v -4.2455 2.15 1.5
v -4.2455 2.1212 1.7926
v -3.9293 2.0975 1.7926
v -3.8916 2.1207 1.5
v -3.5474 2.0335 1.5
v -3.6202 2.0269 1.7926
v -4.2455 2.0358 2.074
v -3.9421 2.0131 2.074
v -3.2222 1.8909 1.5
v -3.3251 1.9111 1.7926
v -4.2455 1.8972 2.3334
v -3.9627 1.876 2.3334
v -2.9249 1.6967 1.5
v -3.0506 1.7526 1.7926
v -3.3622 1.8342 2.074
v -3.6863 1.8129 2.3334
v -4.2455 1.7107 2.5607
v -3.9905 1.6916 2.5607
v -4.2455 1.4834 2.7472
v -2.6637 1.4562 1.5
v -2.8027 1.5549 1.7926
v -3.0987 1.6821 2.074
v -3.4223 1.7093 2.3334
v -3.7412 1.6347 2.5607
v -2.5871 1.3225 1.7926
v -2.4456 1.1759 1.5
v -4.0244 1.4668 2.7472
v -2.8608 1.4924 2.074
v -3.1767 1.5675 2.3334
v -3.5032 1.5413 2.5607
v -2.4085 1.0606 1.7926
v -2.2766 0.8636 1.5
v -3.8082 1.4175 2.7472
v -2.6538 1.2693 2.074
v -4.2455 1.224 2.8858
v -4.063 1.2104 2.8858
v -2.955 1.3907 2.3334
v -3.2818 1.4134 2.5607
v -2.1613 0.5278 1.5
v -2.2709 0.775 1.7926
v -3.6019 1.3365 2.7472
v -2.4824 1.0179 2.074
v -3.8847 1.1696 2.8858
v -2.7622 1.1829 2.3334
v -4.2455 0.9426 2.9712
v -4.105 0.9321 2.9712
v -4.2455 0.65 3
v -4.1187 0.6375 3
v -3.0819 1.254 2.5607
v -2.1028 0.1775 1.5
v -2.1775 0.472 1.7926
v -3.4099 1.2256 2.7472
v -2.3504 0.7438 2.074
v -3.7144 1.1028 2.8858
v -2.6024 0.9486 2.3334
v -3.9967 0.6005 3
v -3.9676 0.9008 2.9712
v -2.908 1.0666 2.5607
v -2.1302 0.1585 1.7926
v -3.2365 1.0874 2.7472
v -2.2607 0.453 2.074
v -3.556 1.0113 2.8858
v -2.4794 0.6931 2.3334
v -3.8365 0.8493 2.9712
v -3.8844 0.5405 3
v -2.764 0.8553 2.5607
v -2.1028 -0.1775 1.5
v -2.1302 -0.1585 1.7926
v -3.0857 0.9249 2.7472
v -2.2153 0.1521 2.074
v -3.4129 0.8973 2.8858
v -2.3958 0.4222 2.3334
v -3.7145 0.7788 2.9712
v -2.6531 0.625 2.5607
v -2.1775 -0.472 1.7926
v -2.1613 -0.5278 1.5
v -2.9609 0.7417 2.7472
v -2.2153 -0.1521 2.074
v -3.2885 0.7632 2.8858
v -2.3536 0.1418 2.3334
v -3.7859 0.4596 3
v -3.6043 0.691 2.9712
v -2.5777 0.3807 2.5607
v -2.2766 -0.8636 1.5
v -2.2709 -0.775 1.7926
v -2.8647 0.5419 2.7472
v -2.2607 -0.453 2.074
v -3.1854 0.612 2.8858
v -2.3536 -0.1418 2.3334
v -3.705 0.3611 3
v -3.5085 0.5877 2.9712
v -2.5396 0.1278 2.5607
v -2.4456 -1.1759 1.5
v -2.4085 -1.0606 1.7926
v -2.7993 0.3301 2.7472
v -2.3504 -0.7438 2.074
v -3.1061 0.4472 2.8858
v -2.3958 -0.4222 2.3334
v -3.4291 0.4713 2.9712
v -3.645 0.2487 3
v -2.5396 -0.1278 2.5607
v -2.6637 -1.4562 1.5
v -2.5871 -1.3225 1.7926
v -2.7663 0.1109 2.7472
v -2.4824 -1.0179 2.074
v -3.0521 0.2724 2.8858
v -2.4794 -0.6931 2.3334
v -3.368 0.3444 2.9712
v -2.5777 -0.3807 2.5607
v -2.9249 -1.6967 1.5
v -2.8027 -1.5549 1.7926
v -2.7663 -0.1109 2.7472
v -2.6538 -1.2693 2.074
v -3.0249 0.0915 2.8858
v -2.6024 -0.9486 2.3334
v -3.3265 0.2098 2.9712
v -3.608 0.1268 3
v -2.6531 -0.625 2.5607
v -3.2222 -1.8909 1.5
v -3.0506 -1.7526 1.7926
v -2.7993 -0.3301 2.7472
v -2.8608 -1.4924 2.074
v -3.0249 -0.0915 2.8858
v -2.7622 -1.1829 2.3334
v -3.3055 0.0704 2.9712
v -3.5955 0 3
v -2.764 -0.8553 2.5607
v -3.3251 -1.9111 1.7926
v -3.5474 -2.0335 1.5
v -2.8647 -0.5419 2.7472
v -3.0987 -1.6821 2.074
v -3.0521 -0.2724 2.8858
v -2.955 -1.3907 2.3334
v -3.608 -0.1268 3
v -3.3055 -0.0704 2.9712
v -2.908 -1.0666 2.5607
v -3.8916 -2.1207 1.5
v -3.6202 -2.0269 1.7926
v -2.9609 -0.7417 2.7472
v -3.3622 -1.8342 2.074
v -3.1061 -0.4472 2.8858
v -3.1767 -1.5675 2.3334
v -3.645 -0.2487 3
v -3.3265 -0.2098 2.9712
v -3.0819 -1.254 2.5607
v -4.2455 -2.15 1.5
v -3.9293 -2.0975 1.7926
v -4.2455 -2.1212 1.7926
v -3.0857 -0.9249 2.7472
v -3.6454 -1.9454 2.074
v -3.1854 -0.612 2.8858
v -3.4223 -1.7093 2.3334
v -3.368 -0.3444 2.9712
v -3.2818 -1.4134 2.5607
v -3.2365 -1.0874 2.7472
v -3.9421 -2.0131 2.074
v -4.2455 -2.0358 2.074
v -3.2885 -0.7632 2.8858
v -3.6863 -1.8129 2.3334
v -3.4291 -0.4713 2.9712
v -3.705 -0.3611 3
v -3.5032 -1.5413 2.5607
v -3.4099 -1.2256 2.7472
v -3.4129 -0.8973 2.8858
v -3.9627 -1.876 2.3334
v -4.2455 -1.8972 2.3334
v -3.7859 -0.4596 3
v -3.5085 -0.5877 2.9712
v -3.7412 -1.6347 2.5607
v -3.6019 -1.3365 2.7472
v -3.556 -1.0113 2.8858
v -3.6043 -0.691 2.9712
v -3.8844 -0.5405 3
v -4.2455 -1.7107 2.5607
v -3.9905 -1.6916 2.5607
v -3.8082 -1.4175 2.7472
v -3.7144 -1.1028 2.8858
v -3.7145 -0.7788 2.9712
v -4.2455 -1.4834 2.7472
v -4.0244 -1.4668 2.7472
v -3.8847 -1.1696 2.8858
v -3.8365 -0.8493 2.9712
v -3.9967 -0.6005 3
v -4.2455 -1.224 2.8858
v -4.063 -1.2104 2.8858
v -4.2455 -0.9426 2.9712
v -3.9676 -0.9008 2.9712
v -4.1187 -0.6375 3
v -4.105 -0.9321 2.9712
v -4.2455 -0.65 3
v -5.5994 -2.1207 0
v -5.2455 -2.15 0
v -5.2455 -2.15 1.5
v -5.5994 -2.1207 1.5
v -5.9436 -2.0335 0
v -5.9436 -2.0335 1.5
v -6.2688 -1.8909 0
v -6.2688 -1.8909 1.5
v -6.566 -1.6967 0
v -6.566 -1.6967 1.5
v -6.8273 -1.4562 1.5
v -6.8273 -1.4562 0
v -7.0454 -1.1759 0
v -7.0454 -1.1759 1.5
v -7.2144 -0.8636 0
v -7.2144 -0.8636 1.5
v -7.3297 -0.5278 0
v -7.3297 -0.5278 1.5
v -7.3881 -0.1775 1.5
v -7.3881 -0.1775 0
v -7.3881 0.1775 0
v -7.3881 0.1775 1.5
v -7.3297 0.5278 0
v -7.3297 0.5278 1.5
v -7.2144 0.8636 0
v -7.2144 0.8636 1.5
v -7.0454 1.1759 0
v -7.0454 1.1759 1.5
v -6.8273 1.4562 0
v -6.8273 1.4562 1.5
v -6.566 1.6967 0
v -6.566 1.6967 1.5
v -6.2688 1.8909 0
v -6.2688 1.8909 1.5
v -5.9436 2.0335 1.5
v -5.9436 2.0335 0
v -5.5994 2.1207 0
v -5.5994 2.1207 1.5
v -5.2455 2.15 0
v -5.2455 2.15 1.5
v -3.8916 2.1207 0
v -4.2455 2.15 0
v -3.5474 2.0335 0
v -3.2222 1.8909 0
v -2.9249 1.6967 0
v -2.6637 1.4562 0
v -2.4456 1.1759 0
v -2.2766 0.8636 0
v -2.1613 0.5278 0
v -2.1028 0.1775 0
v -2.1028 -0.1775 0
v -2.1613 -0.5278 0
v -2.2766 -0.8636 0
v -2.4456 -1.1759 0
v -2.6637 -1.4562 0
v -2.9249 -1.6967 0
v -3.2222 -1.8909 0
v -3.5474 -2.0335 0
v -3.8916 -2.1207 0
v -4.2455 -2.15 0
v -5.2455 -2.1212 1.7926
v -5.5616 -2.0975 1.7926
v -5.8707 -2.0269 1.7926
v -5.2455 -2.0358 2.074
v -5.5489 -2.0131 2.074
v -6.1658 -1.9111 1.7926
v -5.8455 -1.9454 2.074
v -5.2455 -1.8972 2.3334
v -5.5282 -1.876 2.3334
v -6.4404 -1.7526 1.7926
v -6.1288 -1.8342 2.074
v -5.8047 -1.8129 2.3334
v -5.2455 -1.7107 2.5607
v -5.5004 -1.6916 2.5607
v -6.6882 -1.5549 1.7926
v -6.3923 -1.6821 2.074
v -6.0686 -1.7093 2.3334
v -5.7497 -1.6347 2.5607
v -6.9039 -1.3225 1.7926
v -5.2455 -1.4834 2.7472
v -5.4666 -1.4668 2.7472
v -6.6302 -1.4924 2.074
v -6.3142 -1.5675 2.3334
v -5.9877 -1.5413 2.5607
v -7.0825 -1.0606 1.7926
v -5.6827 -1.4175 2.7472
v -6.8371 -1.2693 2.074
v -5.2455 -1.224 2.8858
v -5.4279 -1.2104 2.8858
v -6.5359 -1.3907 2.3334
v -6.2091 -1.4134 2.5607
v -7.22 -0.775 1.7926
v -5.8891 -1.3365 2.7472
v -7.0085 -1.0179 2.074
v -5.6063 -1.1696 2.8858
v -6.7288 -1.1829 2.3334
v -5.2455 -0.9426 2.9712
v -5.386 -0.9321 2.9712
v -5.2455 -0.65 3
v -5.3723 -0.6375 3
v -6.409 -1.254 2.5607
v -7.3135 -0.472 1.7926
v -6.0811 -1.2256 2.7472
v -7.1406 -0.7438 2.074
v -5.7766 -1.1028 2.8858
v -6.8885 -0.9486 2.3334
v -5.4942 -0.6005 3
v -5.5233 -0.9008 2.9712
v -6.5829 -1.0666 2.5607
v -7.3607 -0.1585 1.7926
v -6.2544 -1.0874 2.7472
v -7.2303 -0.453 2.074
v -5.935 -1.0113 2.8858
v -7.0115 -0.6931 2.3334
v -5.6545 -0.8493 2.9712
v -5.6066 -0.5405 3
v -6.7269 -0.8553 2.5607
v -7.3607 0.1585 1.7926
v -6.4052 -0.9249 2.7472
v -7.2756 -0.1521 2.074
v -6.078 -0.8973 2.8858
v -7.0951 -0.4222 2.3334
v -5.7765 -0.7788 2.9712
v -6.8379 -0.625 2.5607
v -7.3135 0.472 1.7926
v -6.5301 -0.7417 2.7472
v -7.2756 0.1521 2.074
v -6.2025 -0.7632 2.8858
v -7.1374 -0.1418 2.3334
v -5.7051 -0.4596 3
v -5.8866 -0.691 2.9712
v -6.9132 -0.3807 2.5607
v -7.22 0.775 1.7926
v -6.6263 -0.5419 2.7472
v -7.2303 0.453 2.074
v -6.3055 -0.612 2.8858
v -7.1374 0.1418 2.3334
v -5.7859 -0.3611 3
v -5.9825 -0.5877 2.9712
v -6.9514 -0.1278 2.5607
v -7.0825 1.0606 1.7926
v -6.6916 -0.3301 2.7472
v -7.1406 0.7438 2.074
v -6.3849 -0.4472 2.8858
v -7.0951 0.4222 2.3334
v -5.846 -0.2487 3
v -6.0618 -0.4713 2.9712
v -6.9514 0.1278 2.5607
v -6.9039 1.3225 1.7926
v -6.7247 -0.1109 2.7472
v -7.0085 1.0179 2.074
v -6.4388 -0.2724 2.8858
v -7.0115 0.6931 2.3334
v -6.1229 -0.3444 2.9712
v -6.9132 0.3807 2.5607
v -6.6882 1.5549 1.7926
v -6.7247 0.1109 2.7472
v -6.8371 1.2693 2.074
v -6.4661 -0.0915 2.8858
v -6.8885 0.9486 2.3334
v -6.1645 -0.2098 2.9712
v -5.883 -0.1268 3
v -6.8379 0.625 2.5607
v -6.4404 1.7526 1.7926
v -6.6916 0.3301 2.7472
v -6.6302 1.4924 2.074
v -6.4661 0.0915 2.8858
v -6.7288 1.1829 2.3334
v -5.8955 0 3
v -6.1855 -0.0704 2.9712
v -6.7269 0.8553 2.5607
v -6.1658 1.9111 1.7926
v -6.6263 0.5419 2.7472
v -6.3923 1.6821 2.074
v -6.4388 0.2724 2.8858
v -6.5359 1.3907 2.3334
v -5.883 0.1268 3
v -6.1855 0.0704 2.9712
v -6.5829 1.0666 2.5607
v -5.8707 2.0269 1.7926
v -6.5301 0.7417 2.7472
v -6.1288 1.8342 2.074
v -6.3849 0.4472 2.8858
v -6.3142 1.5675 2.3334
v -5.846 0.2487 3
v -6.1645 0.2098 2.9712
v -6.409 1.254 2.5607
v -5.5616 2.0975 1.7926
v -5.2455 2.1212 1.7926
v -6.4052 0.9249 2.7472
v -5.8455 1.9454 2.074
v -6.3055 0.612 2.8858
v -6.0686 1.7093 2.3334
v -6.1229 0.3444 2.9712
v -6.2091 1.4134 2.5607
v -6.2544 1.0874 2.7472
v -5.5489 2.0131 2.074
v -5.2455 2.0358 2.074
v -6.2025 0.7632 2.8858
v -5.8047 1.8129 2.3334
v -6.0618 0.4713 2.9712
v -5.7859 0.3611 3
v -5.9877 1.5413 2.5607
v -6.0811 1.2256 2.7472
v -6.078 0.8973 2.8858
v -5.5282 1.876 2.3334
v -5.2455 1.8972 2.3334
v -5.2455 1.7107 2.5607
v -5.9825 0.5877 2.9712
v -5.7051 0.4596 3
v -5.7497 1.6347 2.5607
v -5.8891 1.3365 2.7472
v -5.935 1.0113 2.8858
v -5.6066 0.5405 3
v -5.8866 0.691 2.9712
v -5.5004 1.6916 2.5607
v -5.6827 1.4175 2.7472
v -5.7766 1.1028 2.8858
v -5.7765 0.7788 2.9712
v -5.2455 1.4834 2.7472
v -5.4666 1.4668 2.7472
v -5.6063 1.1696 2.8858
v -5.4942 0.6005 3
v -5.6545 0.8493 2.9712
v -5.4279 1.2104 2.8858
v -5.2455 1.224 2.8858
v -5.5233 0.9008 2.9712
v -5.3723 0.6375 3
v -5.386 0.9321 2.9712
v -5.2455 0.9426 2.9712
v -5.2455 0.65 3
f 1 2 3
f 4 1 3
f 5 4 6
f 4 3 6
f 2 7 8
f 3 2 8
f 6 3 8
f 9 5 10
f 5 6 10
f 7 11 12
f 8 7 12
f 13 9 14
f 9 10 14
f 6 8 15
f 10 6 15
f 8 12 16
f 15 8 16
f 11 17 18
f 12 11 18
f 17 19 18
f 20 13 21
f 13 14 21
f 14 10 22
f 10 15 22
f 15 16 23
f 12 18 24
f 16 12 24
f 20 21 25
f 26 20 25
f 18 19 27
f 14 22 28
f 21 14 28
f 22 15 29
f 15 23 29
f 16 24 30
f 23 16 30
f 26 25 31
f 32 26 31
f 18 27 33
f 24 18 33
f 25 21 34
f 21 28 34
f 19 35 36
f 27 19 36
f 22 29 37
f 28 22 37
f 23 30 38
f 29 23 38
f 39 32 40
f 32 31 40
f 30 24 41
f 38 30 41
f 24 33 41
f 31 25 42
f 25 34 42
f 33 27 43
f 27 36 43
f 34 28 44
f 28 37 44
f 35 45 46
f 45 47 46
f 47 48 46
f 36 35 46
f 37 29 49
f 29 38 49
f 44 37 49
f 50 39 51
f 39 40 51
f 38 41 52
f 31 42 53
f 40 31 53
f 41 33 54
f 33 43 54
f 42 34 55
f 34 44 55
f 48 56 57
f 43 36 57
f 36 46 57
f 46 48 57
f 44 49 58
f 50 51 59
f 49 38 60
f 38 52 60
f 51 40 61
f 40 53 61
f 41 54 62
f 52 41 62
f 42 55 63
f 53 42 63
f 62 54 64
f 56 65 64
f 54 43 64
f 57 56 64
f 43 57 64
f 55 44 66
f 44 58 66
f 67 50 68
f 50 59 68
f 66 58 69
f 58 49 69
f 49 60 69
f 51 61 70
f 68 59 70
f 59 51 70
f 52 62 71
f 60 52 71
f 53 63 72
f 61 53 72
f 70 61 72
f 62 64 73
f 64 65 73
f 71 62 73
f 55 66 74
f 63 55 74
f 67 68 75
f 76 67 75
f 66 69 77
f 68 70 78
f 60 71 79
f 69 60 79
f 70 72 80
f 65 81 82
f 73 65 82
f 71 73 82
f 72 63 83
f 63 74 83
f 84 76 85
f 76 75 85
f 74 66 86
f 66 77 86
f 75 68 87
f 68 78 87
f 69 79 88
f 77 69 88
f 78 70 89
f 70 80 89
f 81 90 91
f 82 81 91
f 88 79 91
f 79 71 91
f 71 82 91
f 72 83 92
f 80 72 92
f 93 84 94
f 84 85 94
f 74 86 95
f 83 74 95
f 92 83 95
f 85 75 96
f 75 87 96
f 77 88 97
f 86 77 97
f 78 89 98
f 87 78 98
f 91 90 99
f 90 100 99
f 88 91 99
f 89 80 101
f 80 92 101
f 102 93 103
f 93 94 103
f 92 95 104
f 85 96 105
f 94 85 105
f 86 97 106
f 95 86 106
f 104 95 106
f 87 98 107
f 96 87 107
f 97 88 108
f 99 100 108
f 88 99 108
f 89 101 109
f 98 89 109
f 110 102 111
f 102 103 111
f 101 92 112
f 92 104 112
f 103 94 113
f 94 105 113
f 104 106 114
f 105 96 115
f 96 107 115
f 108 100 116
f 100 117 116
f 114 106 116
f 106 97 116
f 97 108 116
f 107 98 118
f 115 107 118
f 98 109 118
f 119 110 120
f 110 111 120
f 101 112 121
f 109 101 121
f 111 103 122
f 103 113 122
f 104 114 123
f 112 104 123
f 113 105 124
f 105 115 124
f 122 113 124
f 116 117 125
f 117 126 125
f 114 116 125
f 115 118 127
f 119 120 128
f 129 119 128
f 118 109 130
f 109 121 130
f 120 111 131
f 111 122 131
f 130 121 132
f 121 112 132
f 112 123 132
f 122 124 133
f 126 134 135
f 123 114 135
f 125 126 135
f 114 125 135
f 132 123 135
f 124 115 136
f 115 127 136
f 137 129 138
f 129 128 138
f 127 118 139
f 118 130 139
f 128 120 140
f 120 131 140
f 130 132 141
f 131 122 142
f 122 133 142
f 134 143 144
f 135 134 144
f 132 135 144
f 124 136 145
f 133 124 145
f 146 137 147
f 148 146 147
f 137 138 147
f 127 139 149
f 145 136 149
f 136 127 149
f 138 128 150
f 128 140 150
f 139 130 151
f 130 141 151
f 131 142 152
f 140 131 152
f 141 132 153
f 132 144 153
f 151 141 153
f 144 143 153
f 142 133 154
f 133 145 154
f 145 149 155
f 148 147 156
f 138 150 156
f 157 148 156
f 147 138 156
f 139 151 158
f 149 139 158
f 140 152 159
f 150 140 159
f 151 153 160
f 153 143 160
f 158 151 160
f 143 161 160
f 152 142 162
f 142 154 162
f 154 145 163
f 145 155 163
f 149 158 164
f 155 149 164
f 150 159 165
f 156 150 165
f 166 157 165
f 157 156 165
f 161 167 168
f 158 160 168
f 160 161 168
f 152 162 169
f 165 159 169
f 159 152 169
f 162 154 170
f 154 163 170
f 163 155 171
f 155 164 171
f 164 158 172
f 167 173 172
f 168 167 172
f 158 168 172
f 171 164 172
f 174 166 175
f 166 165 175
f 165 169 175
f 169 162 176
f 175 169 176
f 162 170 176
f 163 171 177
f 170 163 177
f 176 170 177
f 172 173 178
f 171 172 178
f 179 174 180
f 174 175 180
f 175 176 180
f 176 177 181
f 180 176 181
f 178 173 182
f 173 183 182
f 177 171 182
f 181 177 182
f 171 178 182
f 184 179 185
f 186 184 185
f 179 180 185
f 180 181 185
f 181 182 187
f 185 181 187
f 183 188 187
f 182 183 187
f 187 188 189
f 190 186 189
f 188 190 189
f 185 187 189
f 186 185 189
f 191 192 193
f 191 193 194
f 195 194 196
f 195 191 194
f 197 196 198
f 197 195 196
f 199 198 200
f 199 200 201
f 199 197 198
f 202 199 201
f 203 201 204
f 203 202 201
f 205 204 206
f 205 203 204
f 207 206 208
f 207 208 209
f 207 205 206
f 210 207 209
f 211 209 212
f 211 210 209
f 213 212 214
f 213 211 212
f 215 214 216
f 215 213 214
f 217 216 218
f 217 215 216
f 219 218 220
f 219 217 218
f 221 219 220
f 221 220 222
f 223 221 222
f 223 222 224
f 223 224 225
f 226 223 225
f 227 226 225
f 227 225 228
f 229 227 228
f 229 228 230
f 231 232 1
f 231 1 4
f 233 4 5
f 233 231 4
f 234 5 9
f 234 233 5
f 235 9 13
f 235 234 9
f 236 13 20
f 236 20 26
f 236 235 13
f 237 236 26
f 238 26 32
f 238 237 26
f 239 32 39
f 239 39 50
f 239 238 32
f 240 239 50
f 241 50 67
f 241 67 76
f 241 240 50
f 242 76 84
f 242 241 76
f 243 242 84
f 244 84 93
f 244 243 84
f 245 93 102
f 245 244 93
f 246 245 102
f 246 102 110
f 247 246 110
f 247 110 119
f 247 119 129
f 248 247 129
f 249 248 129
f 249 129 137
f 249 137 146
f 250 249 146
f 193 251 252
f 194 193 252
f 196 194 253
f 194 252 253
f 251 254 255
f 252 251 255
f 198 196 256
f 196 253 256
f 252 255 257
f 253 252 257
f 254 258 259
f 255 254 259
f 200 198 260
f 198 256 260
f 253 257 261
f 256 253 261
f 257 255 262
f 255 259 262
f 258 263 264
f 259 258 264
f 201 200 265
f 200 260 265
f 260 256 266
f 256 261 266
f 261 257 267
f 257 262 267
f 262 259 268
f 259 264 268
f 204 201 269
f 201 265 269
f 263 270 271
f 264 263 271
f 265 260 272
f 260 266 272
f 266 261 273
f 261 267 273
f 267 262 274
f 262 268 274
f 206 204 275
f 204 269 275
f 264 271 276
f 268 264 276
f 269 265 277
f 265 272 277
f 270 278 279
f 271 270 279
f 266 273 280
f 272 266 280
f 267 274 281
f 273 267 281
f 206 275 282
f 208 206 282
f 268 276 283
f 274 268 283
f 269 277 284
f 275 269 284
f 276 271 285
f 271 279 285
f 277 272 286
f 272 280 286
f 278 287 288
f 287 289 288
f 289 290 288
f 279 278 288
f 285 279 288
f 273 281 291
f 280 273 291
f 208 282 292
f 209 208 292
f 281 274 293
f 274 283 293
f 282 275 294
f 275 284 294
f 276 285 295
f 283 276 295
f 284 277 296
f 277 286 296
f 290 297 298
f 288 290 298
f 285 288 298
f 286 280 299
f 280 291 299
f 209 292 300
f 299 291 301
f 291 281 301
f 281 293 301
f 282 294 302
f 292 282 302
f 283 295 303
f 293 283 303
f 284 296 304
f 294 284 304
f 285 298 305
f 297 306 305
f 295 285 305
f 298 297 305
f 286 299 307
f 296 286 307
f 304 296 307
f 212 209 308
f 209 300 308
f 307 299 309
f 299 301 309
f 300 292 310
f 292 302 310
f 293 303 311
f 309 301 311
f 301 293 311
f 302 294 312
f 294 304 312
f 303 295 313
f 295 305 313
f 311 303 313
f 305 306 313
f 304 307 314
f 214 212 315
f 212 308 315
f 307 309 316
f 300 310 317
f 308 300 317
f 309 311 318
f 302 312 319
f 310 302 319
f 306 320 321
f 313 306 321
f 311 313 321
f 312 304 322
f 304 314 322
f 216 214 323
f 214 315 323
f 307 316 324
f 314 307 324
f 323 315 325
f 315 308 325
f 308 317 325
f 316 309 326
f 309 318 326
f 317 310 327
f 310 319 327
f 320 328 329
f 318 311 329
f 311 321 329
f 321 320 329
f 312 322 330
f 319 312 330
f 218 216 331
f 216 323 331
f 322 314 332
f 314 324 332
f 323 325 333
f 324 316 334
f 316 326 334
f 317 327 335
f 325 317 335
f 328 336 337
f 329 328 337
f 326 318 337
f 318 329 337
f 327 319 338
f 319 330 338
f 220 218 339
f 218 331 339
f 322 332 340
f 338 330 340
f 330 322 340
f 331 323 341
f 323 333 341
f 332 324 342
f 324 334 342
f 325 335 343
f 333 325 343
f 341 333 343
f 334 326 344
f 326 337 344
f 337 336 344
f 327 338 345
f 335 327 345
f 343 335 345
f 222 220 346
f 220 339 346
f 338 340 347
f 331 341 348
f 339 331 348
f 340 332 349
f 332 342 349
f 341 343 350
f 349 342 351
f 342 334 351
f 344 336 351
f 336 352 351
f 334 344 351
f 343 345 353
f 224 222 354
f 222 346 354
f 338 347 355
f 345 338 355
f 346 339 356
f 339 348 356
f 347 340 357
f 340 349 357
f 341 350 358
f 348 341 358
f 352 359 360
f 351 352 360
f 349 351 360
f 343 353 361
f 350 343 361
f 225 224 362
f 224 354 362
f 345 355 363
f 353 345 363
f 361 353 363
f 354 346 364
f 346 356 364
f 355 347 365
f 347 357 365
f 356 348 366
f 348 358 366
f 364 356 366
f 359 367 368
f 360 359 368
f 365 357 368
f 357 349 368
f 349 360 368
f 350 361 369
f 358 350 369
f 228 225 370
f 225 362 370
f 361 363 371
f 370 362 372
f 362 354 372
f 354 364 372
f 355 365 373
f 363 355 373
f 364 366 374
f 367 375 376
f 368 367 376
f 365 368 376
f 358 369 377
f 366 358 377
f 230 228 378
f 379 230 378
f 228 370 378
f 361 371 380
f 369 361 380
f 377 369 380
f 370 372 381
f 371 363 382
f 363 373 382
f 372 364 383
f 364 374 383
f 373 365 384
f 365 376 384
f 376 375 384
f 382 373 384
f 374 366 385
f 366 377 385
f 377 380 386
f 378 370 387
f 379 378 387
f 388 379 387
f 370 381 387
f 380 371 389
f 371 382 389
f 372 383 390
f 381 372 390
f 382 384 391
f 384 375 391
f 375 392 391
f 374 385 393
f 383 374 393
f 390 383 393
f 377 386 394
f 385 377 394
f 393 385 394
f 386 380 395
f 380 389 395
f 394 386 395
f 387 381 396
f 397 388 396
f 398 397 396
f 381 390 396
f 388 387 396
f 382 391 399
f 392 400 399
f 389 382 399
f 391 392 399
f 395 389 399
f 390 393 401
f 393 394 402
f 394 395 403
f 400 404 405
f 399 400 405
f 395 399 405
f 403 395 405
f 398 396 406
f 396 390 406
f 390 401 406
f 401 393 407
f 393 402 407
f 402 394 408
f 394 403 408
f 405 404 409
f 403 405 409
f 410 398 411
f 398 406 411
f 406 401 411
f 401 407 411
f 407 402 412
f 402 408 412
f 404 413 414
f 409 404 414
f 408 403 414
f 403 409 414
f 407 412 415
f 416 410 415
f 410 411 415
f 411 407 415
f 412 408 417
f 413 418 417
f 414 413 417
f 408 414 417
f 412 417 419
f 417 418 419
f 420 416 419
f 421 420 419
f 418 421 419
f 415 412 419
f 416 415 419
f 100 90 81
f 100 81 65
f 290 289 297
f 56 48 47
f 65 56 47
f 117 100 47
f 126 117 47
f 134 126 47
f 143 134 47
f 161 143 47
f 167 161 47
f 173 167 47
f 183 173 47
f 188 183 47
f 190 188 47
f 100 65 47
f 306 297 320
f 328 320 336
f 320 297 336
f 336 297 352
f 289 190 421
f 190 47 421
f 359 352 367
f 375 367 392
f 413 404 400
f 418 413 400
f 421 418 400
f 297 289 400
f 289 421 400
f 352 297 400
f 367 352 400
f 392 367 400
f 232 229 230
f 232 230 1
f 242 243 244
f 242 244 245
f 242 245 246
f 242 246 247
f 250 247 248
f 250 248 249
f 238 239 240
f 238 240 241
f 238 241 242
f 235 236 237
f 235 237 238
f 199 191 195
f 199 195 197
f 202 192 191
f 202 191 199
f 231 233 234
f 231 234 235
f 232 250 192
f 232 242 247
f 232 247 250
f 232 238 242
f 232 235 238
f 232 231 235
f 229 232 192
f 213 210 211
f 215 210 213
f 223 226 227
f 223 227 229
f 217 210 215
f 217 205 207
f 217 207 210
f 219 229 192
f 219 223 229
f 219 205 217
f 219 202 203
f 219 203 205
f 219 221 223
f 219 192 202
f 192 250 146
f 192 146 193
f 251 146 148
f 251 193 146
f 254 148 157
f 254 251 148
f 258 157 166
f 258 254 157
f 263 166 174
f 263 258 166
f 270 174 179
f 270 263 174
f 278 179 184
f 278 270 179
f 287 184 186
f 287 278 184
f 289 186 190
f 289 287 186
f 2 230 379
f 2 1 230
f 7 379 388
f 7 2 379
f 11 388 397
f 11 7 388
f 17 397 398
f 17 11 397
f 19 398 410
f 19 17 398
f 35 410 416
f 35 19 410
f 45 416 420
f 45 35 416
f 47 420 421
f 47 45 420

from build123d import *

# Parameters (mm, degrees)
DODANIE_WYCI_GNI_CIE2_DEPTH = 3
ZAOKR_GLENIE3_R             = 1.5


with BuildPart() as part:
    # Szkic2 → Dodanie-wyciągnięcie2 (new body)
    with BuildSketch(Plane.XY):
        with BuildLine():
            Line((-5.24547374, 2.15), (-4.24547374, 2.15))
            ThreePointArc((-4.24547374, 2.15), (-2.09547374, 0), (-4.24547374, -2.15))
            Line((-4.24547374, -2.15), (-5.24547374, -2.15))
            ThreePointArc((-5.24547374, -2.15), (-7.39547374, 0), (-5.24547374, 2.15))
        make_face()
    extrude(amount=DODANIE_WYCI_GNI_CIE2_DEPTH)

    # Zaokrąglenie3
    zaokr_glenie3_edges = [part.edges().sort_by_distance(p)[0] for p in [
        (-2.09547374, 0, 3),
        (-4.74547374, 2.15, 3),
        (-7.39547374, 0, 3),
        (-4.74547374, -2.15, 3),
    ]]
    fillet(zaokr_glenie3_edges, radius=ZAOKR_GLENIE3_R)


solid = part.part
